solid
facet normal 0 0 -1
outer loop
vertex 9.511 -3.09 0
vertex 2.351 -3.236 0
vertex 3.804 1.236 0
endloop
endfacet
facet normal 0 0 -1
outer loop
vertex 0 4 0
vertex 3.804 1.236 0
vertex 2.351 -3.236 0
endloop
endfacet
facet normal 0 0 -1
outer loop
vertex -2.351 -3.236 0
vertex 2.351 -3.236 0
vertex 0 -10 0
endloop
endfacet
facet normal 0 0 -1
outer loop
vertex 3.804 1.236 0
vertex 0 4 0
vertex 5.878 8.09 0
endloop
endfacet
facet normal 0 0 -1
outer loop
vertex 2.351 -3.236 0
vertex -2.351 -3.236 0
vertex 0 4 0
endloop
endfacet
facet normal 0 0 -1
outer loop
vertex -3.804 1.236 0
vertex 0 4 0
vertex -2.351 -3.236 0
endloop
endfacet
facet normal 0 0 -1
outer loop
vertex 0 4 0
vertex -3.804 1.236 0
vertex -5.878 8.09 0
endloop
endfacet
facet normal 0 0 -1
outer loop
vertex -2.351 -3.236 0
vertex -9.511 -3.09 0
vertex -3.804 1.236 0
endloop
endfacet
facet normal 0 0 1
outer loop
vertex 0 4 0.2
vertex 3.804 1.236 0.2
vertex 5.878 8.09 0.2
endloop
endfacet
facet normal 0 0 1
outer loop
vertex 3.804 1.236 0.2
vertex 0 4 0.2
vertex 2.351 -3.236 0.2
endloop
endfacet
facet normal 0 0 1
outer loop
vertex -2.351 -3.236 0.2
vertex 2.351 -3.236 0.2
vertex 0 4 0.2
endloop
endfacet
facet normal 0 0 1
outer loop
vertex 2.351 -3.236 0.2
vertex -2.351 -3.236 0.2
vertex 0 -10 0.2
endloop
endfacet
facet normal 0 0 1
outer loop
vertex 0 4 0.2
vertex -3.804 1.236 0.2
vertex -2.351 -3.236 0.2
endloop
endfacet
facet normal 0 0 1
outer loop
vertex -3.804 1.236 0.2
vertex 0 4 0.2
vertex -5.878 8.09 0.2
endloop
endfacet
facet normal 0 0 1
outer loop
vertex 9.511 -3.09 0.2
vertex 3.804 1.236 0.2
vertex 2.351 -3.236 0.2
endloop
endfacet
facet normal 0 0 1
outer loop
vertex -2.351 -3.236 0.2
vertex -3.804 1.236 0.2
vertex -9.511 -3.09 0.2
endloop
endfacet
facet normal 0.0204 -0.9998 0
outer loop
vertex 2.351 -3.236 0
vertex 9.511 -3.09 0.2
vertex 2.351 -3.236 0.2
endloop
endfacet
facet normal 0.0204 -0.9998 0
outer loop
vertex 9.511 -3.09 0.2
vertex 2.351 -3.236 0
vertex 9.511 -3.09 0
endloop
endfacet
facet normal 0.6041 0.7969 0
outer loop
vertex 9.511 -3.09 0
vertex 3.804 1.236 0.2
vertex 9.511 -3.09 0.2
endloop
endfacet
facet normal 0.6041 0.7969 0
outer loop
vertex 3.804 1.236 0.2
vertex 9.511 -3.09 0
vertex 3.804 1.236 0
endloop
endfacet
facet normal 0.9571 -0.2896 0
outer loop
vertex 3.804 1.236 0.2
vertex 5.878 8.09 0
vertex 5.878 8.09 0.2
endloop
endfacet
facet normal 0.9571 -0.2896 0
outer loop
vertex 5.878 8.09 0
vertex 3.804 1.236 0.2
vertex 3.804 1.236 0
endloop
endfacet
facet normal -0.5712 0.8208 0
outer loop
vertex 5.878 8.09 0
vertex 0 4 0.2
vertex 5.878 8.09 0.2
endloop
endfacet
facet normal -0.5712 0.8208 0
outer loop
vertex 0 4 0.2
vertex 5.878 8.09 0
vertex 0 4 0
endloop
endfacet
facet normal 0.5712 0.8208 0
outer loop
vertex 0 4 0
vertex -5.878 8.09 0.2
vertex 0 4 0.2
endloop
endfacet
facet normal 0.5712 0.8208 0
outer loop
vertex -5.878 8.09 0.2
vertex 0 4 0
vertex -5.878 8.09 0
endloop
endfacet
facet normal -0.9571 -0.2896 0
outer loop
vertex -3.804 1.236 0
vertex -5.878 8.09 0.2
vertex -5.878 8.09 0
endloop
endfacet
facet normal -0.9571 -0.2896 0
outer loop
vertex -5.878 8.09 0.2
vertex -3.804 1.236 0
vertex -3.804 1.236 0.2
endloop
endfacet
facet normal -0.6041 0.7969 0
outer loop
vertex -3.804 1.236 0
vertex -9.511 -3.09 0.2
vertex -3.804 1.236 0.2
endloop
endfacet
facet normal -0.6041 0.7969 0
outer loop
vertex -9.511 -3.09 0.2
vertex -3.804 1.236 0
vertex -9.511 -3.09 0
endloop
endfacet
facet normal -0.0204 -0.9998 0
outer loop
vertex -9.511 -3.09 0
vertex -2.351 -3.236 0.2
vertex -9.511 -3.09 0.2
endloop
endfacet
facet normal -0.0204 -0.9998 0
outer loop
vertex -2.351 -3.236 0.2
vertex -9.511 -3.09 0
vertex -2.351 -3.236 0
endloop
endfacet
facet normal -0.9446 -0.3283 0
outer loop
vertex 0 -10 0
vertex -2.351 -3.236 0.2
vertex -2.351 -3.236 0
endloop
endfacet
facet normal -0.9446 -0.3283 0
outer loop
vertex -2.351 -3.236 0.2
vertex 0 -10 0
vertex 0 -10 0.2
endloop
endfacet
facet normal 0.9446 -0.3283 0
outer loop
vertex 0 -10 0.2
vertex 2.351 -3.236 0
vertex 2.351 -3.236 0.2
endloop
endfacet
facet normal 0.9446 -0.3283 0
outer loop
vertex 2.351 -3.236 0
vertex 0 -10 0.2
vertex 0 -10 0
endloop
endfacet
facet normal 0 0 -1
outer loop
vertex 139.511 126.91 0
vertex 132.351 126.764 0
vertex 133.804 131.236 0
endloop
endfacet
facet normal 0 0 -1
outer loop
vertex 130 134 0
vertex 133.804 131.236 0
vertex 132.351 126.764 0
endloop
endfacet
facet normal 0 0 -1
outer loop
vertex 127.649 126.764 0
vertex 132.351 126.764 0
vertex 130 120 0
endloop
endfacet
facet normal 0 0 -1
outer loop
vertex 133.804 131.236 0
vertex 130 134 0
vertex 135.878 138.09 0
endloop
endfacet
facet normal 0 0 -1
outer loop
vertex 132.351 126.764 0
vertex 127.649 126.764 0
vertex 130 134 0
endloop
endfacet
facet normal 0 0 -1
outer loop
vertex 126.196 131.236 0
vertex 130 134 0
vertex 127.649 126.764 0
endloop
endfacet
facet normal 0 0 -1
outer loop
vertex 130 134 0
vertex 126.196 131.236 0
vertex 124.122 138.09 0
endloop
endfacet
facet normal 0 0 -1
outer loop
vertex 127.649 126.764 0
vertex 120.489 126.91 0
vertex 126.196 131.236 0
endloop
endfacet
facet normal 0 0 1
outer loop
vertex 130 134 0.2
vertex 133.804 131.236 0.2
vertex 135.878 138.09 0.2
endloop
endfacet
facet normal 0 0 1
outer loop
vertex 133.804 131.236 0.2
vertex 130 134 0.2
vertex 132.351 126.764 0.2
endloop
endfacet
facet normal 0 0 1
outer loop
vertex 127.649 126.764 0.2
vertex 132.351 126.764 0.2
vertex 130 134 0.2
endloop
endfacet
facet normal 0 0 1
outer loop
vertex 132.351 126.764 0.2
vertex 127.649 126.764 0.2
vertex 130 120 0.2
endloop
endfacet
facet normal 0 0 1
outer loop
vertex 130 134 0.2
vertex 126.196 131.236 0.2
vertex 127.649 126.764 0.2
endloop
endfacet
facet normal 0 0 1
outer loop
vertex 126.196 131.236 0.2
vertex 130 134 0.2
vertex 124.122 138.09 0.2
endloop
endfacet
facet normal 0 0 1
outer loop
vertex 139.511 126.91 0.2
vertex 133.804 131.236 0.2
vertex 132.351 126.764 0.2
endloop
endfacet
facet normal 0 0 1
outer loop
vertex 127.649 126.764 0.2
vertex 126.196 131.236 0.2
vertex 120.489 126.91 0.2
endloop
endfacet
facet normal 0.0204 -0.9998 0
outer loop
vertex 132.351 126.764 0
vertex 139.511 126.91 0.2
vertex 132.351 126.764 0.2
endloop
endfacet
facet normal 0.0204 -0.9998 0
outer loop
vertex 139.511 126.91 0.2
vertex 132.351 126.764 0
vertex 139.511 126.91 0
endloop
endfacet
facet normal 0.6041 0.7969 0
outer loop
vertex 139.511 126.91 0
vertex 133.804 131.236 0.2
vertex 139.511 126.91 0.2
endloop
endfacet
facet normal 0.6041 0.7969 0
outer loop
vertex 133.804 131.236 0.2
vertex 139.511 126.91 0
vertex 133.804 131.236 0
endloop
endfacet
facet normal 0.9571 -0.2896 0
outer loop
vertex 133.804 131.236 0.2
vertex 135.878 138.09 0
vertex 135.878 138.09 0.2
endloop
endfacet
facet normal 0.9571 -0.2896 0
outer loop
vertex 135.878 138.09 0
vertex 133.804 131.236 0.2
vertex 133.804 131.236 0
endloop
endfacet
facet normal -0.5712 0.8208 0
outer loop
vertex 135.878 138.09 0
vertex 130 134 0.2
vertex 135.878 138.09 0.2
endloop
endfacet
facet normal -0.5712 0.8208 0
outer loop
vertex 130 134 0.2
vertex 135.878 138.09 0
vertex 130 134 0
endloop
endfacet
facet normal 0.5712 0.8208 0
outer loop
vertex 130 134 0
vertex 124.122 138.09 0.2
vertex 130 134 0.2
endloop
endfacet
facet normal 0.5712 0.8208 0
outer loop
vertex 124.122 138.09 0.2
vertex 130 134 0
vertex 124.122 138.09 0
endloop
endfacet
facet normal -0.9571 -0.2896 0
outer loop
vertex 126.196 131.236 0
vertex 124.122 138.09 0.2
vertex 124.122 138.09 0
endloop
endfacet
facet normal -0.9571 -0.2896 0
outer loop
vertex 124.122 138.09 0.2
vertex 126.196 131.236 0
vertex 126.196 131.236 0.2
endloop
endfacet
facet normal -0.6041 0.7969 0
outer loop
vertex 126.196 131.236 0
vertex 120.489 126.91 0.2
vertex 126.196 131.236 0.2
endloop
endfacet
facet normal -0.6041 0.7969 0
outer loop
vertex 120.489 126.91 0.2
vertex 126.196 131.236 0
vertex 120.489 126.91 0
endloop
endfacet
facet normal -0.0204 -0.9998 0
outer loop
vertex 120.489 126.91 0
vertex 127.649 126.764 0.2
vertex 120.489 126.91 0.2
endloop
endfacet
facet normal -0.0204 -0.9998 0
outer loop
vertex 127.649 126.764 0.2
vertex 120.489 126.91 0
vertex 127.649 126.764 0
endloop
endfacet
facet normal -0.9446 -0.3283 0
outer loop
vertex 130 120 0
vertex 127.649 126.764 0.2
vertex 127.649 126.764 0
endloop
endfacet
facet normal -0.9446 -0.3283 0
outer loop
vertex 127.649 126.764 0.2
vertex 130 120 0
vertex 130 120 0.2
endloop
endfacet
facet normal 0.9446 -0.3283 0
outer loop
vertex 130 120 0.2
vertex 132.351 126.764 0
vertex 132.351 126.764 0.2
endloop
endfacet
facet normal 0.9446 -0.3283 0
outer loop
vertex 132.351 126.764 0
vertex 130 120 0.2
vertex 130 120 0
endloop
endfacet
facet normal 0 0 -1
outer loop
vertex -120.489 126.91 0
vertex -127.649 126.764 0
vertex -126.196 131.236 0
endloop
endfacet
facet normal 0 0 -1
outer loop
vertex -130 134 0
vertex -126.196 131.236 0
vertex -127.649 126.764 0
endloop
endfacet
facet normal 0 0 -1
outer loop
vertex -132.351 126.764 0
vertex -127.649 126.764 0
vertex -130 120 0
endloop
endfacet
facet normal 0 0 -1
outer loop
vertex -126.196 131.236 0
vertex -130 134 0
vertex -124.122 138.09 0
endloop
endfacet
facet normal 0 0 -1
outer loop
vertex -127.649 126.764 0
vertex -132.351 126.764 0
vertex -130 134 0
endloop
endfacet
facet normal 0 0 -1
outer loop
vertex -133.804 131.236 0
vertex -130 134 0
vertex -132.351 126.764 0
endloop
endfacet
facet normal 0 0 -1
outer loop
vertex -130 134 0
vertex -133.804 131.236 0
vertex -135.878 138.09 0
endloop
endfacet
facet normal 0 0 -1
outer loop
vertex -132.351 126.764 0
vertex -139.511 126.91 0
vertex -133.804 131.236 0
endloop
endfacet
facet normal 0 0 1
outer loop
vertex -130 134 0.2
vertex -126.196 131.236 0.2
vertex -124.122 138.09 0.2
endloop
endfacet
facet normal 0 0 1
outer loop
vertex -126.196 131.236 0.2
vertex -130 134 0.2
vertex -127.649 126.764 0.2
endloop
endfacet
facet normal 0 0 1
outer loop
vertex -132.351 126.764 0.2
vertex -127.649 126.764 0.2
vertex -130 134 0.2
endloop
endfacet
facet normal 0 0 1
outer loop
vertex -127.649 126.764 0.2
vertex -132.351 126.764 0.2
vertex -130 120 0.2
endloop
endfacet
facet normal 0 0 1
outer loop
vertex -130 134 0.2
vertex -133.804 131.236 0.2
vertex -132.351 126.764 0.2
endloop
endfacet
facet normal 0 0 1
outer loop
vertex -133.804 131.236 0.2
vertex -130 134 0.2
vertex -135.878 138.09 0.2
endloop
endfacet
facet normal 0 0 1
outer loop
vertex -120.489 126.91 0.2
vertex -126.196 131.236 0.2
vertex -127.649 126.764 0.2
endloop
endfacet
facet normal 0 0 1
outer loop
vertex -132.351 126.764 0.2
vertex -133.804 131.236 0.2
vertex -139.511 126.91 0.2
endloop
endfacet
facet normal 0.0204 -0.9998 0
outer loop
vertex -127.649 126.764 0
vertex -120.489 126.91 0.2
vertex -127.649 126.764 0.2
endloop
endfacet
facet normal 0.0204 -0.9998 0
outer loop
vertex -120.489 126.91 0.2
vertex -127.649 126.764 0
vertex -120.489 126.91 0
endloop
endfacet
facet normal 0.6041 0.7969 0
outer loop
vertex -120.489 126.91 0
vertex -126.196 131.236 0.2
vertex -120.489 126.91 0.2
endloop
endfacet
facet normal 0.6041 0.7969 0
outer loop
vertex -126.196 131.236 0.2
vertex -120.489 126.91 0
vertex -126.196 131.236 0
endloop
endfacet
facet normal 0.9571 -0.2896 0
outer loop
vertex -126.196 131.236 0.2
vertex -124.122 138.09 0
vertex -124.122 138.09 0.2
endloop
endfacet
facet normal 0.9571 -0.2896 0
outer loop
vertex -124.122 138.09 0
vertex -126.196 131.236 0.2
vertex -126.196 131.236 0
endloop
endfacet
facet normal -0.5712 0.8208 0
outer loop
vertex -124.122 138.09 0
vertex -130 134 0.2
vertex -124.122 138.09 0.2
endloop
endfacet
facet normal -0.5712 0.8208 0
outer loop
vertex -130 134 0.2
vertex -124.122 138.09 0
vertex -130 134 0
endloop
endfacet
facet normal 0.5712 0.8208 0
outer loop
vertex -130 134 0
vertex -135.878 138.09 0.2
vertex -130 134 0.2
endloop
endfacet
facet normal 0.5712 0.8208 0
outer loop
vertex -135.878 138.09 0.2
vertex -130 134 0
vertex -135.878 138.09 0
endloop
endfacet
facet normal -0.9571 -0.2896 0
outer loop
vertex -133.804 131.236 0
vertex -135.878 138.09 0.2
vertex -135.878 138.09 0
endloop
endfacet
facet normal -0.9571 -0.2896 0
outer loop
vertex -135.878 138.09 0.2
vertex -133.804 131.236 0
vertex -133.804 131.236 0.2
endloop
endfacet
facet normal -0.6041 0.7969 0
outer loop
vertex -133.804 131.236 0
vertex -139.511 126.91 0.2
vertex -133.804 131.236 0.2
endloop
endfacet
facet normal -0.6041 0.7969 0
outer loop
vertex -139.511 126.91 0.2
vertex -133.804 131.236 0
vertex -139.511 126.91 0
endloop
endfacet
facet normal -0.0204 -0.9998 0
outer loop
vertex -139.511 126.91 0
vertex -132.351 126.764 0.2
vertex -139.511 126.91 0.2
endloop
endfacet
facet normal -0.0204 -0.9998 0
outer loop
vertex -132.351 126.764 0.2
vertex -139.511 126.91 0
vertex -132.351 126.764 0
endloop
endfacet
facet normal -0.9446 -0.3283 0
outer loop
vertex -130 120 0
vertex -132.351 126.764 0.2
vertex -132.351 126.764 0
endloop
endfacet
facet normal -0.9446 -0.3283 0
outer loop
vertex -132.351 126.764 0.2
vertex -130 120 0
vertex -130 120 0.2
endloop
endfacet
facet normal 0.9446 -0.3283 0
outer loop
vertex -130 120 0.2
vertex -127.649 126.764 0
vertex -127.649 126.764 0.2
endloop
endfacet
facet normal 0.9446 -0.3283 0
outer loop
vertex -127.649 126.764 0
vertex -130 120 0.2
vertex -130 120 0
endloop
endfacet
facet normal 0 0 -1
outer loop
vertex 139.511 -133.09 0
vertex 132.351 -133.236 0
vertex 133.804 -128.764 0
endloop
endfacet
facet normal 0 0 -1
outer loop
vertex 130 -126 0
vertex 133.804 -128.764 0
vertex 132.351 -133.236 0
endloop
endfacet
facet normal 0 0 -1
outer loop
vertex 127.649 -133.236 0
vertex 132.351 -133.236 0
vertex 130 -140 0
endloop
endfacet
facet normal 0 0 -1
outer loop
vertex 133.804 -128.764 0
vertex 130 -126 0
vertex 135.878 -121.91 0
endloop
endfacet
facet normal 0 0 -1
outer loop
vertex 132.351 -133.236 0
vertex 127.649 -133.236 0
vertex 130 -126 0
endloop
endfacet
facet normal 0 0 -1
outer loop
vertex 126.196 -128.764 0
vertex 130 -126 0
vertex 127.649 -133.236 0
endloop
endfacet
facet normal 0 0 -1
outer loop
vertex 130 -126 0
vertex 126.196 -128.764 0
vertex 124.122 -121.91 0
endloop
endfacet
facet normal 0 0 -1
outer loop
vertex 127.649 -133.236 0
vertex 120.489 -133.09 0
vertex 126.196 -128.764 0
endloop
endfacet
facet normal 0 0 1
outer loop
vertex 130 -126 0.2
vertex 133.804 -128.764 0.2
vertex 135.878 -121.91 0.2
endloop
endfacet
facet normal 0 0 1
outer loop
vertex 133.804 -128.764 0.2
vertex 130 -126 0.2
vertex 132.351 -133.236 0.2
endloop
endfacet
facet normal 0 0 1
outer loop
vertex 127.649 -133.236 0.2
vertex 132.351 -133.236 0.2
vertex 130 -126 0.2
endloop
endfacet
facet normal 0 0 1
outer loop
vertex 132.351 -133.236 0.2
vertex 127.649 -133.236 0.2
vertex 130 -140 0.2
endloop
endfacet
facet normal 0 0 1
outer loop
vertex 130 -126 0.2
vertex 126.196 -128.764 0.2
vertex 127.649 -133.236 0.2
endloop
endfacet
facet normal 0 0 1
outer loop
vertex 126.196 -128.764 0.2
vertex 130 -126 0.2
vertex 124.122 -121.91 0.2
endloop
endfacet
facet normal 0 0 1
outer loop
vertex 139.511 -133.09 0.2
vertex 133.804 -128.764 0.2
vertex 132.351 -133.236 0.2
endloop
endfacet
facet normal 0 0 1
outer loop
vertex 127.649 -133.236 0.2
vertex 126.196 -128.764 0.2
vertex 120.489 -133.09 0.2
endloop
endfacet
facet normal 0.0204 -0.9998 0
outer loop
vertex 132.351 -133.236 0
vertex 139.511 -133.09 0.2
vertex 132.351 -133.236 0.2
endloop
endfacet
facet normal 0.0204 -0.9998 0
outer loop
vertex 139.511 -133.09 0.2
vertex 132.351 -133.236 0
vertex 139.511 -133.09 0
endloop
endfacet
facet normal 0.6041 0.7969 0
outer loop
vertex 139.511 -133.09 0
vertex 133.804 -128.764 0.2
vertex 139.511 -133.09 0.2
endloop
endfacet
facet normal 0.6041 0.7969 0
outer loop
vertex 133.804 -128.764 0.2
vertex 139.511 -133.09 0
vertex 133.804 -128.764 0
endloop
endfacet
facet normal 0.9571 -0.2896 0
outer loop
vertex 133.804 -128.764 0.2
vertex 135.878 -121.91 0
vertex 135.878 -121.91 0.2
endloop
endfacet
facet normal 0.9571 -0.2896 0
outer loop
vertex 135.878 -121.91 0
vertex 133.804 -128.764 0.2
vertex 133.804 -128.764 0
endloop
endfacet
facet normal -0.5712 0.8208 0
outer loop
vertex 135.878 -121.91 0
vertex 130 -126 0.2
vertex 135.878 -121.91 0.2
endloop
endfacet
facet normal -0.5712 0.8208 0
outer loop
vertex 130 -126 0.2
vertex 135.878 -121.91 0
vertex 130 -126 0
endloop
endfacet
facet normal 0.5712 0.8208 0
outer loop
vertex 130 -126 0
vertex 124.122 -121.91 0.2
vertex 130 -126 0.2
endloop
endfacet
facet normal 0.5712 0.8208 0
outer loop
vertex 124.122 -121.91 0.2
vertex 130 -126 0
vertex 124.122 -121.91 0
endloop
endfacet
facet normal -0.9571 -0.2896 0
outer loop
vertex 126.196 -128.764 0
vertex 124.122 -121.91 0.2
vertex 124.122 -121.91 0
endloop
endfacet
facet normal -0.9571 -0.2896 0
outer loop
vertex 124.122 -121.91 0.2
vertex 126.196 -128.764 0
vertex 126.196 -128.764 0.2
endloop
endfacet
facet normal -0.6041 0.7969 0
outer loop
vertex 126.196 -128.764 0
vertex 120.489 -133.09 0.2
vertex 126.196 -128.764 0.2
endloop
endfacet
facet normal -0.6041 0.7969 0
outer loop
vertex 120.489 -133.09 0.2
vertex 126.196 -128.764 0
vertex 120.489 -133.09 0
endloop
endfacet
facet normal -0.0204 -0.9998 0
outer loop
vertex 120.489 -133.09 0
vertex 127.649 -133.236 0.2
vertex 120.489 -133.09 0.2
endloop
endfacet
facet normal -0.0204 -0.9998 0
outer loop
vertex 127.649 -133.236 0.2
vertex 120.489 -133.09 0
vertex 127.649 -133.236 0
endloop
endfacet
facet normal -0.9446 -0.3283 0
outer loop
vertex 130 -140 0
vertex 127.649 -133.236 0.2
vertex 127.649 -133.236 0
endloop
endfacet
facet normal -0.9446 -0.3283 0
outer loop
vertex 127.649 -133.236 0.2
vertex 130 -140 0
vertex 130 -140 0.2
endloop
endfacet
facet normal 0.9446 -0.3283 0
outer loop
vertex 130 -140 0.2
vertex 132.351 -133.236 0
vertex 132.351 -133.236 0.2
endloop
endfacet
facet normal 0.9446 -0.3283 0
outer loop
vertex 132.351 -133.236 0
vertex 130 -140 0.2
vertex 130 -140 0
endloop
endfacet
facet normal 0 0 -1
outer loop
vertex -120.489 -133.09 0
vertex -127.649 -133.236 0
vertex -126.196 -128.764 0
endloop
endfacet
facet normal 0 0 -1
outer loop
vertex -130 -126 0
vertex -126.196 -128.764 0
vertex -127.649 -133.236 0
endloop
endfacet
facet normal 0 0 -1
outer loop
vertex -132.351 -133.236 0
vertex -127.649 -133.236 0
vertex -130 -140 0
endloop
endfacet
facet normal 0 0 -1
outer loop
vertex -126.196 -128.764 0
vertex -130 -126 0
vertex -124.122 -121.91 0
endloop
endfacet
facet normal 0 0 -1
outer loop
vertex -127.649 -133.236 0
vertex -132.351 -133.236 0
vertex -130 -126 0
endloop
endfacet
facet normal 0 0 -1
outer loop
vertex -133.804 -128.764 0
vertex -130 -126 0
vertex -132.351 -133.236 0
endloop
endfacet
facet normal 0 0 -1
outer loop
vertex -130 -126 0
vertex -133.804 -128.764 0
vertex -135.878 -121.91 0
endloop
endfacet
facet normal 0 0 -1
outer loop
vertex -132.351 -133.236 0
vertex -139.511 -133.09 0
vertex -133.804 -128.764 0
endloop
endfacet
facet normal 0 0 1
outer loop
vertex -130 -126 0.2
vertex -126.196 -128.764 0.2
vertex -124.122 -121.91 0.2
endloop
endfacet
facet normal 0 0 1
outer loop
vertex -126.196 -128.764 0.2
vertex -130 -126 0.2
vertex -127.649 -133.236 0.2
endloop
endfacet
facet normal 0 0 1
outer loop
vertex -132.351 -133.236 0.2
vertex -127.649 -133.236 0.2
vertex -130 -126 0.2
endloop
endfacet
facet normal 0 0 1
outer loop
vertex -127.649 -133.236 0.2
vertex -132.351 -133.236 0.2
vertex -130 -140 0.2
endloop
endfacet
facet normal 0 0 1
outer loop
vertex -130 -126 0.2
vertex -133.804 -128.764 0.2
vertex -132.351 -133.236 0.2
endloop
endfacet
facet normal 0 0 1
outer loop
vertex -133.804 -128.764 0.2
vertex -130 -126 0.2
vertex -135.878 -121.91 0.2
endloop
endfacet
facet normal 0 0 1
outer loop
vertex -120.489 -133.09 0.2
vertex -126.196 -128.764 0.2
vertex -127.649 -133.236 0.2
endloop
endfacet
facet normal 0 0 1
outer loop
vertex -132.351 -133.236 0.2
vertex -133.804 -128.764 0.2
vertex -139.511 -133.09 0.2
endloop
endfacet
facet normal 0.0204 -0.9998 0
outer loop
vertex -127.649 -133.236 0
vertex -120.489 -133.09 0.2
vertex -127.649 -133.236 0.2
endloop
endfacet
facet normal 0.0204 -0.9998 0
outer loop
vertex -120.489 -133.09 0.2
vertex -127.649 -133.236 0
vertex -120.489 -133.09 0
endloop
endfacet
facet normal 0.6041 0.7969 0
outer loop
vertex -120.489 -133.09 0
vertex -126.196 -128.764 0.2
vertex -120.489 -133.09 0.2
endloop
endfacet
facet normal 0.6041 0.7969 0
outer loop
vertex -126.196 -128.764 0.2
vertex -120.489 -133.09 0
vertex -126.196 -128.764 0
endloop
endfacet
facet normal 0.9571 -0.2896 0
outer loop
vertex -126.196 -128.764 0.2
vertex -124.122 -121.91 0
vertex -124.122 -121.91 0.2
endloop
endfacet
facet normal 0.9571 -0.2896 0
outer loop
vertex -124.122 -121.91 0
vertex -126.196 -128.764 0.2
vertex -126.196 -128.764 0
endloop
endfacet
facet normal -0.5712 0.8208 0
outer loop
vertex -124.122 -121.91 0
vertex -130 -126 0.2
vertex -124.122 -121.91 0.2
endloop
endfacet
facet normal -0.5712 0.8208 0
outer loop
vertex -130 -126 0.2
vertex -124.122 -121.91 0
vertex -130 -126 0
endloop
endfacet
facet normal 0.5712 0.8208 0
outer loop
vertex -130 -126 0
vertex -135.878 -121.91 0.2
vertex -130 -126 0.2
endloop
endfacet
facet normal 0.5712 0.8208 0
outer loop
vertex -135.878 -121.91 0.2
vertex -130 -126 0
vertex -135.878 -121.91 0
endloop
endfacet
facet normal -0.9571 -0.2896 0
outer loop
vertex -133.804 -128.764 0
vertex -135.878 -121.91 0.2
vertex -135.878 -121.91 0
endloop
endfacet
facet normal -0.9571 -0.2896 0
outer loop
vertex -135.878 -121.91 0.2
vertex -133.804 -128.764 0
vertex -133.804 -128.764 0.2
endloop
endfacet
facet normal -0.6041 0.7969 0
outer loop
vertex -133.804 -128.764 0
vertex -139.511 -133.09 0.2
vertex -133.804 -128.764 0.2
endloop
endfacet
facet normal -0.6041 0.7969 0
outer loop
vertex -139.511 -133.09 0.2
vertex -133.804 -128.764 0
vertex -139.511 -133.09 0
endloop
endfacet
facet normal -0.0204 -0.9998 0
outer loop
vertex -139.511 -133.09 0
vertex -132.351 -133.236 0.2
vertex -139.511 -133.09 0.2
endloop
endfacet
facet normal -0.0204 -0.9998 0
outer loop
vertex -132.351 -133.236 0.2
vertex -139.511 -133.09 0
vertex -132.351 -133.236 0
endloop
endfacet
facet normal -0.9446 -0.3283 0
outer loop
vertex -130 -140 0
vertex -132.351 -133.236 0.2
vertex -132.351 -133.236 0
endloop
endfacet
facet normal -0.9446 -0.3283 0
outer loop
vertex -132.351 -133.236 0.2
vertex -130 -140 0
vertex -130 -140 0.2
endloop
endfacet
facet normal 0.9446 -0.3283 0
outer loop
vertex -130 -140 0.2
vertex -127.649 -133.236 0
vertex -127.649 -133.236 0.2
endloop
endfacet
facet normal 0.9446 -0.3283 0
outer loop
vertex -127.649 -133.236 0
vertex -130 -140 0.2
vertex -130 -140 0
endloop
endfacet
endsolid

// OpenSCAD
/// Configuration begins --->
// - Printer settings
margin=10;
bedShape="s"; // r: round, s: rectangular(kind of [s]quare-ish)
// -- Rectangular bed
XBed=300;
YBed=300;
// -- Round bed
RBed=100;

// - Test object
objSize=20;
objHeight=0.2; // Could also be layer thichness
objShape="s"; // r: rectangle, c: circle, s: star
createCenterObj=true; 

/// <--- Configuration ends

placeObjects();

module placeObjects() {
  if(bedShape == "r")
    placeObjectsRound();
  else if(bedShape == "s")
    placeObjectsRect();
  else
    warn();
}

module placeObjectsRound() {
  r=RBed-margin-objSize/2;
  if(createCenterObj)
    shape();
  
  aOffset = 0; // 360/6; // This might not make much sense to have... anyway I will keep it like this. The point is to be able to test the leveling/adhesion between the towers.
  for(a=[0: 360/3: 359])
    translate(r*[sin(a+aOffset), cos(a+aOffset)])
      shape();
}

module placeObjectsRect() {
  x=(XBed-objSize)/2-margin;
  y=(YBed-objSize)/2-margin;

  if(createCenterObj)
    shape();
  translate([x, y])
    shape();
  translate([-x, y])
    shape();
  translate([x, -y])
    shape();
  translate([-x, -y])
    shape();
}

module shape() {
  if(objShape == "r")
    cube([objSize, objSize, 0.2], center=true);
  else if(objShape == "c")
    cylinder(r=objSize/2, h=objHeight);
  else if(objShape == "s")
   star(); 
}

module star() {
  numberOfSpikes = 5;
  da=360/(2*numberOfSpikes);
  function r(i) = i%2 ? objSize/2 : 0.4*objSize/2;
  points = [ 
    for (i = [0 : 1 : 2*numberOfSpikes]) 
      r(i) * [ sin(i*da), cos(i*da) ]
  ];
   
  linear_extrude(height=objHeight)
    polygon(points);
}

module warn() {
  echo(str("<font style='background:yellow; font-weight:bold; font-size:x-large;'>CONFIGURATION IS INVALID!!!</font>"));
  
  // Since it is not possible to exit the program on error, the second best will be to fuck up the generated output
  cube([100000, 100000, 10000], center=true);
}
